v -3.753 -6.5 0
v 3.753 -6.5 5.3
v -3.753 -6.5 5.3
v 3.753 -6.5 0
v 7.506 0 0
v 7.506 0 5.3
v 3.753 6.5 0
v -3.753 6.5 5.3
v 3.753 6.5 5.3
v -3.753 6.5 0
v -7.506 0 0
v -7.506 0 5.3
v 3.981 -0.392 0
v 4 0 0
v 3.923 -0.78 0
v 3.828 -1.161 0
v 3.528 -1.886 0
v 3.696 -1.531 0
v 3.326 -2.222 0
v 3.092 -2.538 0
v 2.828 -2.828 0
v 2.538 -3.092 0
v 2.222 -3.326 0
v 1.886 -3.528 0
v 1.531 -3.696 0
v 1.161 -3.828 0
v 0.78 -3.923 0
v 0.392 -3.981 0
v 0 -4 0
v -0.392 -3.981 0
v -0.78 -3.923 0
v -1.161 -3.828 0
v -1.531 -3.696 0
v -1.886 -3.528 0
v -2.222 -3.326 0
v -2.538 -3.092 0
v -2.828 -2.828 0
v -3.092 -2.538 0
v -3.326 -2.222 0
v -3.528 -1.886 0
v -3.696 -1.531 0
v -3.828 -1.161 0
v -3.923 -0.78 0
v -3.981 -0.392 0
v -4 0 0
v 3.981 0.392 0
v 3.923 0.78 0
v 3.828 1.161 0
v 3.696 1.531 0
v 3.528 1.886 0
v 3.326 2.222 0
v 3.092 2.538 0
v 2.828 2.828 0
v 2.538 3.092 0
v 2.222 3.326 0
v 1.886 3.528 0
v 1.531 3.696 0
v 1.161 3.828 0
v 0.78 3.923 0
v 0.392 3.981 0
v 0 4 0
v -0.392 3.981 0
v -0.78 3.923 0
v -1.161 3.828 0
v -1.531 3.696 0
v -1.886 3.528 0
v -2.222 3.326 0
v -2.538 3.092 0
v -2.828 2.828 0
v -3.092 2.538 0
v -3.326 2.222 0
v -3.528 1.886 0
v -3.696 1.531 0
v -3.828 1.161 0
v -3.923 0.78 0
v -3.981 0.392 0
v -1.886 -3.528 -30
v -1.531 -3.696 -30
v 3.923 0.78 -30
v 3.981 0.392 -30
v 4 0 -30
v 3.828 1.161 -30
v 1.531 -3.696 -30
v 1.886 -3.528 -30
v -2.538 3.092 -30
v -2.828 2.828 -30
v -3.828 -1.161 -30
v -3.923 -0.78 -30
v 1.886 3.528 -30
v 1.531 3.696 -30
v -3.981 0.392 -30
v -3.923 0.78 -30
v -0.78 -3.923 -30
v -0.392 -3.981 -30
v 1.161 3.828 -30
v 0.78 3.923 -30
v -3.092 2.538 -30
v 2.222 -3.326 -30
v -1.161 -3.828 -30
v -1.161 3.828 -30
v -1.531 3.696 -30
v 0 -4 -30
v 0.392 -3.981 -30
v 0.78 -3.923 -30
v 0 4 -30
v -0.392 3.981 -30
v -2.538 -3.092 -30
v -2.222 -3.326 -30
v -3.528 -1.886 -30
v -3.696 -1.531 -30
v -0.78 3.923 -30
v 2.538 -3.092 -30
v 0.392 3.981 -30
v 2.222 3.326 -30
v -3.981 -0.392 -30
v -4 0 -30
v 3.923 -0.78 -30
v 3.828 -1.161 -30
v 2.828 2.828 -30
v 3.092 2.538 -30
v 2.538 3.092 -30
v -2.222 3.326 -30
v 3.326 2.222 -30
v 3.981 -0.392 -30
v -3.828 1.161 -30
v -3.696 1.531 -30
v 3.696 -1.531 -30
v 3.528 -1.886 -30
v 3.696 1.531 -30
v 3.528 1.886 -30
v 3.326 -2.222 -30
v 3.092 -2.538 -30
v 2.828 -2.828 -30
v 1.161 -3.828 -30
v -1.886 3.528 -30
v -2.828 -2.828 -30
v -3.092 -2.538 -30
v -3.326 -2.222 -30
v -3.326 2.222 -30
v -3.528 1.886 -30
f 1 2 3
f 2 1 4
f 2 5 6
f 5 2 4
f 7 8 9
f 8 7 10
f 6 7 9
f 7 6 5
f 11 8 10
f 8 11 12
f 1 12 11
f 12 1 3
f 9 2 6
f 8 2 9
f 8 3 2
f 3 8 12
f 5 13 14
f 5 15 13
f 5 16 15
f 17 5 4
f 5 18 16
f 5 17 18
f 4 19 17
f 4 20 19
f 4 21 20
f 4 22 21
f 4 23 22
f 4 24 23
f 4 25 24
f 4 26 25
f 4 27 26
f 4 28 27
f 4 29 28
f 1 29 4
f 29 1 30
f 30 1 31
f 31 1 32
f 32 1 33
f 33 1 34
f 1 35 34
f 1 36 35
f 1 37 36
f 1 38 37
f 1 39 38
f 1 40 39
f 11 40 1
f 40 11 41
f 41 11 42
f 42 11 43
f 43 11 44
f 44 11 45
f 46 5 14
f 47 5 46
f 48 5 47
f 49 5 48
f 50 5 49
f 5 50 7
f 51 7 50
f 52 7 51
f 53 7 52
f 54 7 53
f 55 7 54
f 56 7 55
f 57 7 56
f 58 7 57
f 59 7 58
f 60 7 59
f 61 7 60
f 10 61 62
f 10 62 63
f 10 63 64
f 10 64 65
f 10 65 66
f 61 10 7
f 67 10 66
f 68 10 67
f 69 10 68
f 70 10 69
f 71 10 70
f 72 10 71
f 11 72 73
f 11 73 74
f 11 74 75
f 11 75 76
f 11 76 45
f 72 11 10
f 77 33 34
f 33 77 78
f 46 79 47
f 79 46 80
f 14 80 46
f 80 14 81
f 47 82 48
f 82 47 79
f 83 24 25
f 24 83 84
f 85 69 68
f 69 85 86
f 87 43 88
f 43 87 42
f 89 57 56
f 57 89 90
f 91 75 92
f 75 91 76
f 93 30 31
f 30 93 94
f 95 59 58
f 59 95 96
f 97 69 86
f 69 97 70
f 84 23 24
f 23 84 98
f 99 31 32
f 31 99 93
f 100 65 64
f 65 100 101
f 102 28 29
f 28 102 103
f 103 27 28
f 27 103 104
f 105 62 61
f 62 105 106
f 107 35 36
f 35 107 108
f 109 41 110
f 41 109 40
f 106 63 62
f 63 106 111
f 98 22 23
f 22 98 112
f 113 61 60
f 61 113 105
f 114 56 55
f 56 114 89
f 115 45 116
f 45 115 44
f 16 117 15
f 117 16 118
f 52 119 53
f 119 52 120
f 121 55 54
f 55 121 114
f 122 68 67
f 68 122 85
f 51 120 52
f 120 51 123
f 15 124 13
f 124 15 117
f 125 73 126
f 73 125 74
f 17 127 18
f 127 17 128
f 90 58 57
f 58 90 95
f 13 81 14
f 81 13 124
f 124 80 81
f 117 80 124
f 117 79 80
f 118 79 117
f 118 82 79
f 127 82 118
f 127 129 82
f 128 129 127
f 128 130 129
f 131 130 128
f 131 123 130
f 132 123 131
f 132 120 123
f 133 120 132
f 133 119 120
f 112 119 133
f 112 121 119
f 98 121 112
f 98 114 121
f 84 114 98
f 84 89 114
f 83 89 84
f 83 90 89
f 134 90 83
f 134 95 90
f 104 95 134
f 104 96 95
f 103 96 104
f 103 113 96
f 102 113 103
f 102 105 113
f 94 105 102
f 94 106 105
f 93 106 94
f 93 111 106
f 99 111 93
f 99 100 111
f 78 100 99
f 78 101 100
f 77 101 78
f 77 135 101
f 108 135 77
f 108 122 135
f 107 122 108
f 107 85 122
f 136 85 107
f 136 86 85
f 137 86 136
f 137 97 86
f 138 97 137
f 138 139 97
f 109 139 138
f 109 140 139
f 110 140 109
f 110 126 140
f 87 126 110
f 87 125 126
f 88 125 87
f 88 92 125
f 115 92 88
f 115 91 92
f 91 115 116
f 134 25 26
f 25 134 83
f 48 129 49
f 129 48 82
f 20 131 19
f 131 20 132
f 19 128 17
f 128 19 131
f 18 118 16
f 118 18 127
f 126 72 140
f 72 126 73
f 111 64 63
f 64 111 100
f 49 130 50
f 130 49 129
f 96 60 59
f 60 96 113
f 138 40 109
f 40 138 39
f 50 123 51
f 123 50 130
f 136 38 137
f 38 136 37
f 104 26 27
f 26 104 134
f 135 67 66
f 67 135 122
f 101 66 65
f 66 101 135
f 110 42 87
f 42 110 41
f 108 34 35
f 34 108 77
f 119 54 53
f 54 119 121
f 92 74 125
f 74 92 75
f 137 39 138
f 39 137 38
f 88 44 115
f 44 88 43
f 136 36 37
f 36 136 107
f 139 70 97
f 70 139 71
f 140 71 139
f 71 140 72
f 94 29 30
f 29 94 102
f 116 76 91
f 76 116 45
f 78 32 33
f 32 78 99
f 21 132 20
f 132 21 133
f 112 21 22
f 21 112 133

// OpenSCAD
// M8 六角ボルト(ねじ山省略)
// 頭部底面が z=0、頭部は +Z 側、シャンクは -Z 側

af   = 13;    // 頭部 対辺距離 (across-flats) [mm]
head_h = 5.3; // 頭部高さ [mm]
shank_d = 8;  // シャンク直径 [mm]
shank_l = 30; // シャンク長さ [mm]

$fn = 64;

module m8_hex_bolt() {
    union() {
        // 頭部(六角柱)
        // cylinder の $fn=6 は外接円基準なので、対辺距離から外接円径に変換
        cylinder(h = head_h, d = af / cos(30), $fn = 6);

        // シャンク(z<0 側へ)
        translate([0, 0, -shank_l])
            cylinder(h = shank_l, d = shank_d);
    }
}

m8_hex_bolt();
